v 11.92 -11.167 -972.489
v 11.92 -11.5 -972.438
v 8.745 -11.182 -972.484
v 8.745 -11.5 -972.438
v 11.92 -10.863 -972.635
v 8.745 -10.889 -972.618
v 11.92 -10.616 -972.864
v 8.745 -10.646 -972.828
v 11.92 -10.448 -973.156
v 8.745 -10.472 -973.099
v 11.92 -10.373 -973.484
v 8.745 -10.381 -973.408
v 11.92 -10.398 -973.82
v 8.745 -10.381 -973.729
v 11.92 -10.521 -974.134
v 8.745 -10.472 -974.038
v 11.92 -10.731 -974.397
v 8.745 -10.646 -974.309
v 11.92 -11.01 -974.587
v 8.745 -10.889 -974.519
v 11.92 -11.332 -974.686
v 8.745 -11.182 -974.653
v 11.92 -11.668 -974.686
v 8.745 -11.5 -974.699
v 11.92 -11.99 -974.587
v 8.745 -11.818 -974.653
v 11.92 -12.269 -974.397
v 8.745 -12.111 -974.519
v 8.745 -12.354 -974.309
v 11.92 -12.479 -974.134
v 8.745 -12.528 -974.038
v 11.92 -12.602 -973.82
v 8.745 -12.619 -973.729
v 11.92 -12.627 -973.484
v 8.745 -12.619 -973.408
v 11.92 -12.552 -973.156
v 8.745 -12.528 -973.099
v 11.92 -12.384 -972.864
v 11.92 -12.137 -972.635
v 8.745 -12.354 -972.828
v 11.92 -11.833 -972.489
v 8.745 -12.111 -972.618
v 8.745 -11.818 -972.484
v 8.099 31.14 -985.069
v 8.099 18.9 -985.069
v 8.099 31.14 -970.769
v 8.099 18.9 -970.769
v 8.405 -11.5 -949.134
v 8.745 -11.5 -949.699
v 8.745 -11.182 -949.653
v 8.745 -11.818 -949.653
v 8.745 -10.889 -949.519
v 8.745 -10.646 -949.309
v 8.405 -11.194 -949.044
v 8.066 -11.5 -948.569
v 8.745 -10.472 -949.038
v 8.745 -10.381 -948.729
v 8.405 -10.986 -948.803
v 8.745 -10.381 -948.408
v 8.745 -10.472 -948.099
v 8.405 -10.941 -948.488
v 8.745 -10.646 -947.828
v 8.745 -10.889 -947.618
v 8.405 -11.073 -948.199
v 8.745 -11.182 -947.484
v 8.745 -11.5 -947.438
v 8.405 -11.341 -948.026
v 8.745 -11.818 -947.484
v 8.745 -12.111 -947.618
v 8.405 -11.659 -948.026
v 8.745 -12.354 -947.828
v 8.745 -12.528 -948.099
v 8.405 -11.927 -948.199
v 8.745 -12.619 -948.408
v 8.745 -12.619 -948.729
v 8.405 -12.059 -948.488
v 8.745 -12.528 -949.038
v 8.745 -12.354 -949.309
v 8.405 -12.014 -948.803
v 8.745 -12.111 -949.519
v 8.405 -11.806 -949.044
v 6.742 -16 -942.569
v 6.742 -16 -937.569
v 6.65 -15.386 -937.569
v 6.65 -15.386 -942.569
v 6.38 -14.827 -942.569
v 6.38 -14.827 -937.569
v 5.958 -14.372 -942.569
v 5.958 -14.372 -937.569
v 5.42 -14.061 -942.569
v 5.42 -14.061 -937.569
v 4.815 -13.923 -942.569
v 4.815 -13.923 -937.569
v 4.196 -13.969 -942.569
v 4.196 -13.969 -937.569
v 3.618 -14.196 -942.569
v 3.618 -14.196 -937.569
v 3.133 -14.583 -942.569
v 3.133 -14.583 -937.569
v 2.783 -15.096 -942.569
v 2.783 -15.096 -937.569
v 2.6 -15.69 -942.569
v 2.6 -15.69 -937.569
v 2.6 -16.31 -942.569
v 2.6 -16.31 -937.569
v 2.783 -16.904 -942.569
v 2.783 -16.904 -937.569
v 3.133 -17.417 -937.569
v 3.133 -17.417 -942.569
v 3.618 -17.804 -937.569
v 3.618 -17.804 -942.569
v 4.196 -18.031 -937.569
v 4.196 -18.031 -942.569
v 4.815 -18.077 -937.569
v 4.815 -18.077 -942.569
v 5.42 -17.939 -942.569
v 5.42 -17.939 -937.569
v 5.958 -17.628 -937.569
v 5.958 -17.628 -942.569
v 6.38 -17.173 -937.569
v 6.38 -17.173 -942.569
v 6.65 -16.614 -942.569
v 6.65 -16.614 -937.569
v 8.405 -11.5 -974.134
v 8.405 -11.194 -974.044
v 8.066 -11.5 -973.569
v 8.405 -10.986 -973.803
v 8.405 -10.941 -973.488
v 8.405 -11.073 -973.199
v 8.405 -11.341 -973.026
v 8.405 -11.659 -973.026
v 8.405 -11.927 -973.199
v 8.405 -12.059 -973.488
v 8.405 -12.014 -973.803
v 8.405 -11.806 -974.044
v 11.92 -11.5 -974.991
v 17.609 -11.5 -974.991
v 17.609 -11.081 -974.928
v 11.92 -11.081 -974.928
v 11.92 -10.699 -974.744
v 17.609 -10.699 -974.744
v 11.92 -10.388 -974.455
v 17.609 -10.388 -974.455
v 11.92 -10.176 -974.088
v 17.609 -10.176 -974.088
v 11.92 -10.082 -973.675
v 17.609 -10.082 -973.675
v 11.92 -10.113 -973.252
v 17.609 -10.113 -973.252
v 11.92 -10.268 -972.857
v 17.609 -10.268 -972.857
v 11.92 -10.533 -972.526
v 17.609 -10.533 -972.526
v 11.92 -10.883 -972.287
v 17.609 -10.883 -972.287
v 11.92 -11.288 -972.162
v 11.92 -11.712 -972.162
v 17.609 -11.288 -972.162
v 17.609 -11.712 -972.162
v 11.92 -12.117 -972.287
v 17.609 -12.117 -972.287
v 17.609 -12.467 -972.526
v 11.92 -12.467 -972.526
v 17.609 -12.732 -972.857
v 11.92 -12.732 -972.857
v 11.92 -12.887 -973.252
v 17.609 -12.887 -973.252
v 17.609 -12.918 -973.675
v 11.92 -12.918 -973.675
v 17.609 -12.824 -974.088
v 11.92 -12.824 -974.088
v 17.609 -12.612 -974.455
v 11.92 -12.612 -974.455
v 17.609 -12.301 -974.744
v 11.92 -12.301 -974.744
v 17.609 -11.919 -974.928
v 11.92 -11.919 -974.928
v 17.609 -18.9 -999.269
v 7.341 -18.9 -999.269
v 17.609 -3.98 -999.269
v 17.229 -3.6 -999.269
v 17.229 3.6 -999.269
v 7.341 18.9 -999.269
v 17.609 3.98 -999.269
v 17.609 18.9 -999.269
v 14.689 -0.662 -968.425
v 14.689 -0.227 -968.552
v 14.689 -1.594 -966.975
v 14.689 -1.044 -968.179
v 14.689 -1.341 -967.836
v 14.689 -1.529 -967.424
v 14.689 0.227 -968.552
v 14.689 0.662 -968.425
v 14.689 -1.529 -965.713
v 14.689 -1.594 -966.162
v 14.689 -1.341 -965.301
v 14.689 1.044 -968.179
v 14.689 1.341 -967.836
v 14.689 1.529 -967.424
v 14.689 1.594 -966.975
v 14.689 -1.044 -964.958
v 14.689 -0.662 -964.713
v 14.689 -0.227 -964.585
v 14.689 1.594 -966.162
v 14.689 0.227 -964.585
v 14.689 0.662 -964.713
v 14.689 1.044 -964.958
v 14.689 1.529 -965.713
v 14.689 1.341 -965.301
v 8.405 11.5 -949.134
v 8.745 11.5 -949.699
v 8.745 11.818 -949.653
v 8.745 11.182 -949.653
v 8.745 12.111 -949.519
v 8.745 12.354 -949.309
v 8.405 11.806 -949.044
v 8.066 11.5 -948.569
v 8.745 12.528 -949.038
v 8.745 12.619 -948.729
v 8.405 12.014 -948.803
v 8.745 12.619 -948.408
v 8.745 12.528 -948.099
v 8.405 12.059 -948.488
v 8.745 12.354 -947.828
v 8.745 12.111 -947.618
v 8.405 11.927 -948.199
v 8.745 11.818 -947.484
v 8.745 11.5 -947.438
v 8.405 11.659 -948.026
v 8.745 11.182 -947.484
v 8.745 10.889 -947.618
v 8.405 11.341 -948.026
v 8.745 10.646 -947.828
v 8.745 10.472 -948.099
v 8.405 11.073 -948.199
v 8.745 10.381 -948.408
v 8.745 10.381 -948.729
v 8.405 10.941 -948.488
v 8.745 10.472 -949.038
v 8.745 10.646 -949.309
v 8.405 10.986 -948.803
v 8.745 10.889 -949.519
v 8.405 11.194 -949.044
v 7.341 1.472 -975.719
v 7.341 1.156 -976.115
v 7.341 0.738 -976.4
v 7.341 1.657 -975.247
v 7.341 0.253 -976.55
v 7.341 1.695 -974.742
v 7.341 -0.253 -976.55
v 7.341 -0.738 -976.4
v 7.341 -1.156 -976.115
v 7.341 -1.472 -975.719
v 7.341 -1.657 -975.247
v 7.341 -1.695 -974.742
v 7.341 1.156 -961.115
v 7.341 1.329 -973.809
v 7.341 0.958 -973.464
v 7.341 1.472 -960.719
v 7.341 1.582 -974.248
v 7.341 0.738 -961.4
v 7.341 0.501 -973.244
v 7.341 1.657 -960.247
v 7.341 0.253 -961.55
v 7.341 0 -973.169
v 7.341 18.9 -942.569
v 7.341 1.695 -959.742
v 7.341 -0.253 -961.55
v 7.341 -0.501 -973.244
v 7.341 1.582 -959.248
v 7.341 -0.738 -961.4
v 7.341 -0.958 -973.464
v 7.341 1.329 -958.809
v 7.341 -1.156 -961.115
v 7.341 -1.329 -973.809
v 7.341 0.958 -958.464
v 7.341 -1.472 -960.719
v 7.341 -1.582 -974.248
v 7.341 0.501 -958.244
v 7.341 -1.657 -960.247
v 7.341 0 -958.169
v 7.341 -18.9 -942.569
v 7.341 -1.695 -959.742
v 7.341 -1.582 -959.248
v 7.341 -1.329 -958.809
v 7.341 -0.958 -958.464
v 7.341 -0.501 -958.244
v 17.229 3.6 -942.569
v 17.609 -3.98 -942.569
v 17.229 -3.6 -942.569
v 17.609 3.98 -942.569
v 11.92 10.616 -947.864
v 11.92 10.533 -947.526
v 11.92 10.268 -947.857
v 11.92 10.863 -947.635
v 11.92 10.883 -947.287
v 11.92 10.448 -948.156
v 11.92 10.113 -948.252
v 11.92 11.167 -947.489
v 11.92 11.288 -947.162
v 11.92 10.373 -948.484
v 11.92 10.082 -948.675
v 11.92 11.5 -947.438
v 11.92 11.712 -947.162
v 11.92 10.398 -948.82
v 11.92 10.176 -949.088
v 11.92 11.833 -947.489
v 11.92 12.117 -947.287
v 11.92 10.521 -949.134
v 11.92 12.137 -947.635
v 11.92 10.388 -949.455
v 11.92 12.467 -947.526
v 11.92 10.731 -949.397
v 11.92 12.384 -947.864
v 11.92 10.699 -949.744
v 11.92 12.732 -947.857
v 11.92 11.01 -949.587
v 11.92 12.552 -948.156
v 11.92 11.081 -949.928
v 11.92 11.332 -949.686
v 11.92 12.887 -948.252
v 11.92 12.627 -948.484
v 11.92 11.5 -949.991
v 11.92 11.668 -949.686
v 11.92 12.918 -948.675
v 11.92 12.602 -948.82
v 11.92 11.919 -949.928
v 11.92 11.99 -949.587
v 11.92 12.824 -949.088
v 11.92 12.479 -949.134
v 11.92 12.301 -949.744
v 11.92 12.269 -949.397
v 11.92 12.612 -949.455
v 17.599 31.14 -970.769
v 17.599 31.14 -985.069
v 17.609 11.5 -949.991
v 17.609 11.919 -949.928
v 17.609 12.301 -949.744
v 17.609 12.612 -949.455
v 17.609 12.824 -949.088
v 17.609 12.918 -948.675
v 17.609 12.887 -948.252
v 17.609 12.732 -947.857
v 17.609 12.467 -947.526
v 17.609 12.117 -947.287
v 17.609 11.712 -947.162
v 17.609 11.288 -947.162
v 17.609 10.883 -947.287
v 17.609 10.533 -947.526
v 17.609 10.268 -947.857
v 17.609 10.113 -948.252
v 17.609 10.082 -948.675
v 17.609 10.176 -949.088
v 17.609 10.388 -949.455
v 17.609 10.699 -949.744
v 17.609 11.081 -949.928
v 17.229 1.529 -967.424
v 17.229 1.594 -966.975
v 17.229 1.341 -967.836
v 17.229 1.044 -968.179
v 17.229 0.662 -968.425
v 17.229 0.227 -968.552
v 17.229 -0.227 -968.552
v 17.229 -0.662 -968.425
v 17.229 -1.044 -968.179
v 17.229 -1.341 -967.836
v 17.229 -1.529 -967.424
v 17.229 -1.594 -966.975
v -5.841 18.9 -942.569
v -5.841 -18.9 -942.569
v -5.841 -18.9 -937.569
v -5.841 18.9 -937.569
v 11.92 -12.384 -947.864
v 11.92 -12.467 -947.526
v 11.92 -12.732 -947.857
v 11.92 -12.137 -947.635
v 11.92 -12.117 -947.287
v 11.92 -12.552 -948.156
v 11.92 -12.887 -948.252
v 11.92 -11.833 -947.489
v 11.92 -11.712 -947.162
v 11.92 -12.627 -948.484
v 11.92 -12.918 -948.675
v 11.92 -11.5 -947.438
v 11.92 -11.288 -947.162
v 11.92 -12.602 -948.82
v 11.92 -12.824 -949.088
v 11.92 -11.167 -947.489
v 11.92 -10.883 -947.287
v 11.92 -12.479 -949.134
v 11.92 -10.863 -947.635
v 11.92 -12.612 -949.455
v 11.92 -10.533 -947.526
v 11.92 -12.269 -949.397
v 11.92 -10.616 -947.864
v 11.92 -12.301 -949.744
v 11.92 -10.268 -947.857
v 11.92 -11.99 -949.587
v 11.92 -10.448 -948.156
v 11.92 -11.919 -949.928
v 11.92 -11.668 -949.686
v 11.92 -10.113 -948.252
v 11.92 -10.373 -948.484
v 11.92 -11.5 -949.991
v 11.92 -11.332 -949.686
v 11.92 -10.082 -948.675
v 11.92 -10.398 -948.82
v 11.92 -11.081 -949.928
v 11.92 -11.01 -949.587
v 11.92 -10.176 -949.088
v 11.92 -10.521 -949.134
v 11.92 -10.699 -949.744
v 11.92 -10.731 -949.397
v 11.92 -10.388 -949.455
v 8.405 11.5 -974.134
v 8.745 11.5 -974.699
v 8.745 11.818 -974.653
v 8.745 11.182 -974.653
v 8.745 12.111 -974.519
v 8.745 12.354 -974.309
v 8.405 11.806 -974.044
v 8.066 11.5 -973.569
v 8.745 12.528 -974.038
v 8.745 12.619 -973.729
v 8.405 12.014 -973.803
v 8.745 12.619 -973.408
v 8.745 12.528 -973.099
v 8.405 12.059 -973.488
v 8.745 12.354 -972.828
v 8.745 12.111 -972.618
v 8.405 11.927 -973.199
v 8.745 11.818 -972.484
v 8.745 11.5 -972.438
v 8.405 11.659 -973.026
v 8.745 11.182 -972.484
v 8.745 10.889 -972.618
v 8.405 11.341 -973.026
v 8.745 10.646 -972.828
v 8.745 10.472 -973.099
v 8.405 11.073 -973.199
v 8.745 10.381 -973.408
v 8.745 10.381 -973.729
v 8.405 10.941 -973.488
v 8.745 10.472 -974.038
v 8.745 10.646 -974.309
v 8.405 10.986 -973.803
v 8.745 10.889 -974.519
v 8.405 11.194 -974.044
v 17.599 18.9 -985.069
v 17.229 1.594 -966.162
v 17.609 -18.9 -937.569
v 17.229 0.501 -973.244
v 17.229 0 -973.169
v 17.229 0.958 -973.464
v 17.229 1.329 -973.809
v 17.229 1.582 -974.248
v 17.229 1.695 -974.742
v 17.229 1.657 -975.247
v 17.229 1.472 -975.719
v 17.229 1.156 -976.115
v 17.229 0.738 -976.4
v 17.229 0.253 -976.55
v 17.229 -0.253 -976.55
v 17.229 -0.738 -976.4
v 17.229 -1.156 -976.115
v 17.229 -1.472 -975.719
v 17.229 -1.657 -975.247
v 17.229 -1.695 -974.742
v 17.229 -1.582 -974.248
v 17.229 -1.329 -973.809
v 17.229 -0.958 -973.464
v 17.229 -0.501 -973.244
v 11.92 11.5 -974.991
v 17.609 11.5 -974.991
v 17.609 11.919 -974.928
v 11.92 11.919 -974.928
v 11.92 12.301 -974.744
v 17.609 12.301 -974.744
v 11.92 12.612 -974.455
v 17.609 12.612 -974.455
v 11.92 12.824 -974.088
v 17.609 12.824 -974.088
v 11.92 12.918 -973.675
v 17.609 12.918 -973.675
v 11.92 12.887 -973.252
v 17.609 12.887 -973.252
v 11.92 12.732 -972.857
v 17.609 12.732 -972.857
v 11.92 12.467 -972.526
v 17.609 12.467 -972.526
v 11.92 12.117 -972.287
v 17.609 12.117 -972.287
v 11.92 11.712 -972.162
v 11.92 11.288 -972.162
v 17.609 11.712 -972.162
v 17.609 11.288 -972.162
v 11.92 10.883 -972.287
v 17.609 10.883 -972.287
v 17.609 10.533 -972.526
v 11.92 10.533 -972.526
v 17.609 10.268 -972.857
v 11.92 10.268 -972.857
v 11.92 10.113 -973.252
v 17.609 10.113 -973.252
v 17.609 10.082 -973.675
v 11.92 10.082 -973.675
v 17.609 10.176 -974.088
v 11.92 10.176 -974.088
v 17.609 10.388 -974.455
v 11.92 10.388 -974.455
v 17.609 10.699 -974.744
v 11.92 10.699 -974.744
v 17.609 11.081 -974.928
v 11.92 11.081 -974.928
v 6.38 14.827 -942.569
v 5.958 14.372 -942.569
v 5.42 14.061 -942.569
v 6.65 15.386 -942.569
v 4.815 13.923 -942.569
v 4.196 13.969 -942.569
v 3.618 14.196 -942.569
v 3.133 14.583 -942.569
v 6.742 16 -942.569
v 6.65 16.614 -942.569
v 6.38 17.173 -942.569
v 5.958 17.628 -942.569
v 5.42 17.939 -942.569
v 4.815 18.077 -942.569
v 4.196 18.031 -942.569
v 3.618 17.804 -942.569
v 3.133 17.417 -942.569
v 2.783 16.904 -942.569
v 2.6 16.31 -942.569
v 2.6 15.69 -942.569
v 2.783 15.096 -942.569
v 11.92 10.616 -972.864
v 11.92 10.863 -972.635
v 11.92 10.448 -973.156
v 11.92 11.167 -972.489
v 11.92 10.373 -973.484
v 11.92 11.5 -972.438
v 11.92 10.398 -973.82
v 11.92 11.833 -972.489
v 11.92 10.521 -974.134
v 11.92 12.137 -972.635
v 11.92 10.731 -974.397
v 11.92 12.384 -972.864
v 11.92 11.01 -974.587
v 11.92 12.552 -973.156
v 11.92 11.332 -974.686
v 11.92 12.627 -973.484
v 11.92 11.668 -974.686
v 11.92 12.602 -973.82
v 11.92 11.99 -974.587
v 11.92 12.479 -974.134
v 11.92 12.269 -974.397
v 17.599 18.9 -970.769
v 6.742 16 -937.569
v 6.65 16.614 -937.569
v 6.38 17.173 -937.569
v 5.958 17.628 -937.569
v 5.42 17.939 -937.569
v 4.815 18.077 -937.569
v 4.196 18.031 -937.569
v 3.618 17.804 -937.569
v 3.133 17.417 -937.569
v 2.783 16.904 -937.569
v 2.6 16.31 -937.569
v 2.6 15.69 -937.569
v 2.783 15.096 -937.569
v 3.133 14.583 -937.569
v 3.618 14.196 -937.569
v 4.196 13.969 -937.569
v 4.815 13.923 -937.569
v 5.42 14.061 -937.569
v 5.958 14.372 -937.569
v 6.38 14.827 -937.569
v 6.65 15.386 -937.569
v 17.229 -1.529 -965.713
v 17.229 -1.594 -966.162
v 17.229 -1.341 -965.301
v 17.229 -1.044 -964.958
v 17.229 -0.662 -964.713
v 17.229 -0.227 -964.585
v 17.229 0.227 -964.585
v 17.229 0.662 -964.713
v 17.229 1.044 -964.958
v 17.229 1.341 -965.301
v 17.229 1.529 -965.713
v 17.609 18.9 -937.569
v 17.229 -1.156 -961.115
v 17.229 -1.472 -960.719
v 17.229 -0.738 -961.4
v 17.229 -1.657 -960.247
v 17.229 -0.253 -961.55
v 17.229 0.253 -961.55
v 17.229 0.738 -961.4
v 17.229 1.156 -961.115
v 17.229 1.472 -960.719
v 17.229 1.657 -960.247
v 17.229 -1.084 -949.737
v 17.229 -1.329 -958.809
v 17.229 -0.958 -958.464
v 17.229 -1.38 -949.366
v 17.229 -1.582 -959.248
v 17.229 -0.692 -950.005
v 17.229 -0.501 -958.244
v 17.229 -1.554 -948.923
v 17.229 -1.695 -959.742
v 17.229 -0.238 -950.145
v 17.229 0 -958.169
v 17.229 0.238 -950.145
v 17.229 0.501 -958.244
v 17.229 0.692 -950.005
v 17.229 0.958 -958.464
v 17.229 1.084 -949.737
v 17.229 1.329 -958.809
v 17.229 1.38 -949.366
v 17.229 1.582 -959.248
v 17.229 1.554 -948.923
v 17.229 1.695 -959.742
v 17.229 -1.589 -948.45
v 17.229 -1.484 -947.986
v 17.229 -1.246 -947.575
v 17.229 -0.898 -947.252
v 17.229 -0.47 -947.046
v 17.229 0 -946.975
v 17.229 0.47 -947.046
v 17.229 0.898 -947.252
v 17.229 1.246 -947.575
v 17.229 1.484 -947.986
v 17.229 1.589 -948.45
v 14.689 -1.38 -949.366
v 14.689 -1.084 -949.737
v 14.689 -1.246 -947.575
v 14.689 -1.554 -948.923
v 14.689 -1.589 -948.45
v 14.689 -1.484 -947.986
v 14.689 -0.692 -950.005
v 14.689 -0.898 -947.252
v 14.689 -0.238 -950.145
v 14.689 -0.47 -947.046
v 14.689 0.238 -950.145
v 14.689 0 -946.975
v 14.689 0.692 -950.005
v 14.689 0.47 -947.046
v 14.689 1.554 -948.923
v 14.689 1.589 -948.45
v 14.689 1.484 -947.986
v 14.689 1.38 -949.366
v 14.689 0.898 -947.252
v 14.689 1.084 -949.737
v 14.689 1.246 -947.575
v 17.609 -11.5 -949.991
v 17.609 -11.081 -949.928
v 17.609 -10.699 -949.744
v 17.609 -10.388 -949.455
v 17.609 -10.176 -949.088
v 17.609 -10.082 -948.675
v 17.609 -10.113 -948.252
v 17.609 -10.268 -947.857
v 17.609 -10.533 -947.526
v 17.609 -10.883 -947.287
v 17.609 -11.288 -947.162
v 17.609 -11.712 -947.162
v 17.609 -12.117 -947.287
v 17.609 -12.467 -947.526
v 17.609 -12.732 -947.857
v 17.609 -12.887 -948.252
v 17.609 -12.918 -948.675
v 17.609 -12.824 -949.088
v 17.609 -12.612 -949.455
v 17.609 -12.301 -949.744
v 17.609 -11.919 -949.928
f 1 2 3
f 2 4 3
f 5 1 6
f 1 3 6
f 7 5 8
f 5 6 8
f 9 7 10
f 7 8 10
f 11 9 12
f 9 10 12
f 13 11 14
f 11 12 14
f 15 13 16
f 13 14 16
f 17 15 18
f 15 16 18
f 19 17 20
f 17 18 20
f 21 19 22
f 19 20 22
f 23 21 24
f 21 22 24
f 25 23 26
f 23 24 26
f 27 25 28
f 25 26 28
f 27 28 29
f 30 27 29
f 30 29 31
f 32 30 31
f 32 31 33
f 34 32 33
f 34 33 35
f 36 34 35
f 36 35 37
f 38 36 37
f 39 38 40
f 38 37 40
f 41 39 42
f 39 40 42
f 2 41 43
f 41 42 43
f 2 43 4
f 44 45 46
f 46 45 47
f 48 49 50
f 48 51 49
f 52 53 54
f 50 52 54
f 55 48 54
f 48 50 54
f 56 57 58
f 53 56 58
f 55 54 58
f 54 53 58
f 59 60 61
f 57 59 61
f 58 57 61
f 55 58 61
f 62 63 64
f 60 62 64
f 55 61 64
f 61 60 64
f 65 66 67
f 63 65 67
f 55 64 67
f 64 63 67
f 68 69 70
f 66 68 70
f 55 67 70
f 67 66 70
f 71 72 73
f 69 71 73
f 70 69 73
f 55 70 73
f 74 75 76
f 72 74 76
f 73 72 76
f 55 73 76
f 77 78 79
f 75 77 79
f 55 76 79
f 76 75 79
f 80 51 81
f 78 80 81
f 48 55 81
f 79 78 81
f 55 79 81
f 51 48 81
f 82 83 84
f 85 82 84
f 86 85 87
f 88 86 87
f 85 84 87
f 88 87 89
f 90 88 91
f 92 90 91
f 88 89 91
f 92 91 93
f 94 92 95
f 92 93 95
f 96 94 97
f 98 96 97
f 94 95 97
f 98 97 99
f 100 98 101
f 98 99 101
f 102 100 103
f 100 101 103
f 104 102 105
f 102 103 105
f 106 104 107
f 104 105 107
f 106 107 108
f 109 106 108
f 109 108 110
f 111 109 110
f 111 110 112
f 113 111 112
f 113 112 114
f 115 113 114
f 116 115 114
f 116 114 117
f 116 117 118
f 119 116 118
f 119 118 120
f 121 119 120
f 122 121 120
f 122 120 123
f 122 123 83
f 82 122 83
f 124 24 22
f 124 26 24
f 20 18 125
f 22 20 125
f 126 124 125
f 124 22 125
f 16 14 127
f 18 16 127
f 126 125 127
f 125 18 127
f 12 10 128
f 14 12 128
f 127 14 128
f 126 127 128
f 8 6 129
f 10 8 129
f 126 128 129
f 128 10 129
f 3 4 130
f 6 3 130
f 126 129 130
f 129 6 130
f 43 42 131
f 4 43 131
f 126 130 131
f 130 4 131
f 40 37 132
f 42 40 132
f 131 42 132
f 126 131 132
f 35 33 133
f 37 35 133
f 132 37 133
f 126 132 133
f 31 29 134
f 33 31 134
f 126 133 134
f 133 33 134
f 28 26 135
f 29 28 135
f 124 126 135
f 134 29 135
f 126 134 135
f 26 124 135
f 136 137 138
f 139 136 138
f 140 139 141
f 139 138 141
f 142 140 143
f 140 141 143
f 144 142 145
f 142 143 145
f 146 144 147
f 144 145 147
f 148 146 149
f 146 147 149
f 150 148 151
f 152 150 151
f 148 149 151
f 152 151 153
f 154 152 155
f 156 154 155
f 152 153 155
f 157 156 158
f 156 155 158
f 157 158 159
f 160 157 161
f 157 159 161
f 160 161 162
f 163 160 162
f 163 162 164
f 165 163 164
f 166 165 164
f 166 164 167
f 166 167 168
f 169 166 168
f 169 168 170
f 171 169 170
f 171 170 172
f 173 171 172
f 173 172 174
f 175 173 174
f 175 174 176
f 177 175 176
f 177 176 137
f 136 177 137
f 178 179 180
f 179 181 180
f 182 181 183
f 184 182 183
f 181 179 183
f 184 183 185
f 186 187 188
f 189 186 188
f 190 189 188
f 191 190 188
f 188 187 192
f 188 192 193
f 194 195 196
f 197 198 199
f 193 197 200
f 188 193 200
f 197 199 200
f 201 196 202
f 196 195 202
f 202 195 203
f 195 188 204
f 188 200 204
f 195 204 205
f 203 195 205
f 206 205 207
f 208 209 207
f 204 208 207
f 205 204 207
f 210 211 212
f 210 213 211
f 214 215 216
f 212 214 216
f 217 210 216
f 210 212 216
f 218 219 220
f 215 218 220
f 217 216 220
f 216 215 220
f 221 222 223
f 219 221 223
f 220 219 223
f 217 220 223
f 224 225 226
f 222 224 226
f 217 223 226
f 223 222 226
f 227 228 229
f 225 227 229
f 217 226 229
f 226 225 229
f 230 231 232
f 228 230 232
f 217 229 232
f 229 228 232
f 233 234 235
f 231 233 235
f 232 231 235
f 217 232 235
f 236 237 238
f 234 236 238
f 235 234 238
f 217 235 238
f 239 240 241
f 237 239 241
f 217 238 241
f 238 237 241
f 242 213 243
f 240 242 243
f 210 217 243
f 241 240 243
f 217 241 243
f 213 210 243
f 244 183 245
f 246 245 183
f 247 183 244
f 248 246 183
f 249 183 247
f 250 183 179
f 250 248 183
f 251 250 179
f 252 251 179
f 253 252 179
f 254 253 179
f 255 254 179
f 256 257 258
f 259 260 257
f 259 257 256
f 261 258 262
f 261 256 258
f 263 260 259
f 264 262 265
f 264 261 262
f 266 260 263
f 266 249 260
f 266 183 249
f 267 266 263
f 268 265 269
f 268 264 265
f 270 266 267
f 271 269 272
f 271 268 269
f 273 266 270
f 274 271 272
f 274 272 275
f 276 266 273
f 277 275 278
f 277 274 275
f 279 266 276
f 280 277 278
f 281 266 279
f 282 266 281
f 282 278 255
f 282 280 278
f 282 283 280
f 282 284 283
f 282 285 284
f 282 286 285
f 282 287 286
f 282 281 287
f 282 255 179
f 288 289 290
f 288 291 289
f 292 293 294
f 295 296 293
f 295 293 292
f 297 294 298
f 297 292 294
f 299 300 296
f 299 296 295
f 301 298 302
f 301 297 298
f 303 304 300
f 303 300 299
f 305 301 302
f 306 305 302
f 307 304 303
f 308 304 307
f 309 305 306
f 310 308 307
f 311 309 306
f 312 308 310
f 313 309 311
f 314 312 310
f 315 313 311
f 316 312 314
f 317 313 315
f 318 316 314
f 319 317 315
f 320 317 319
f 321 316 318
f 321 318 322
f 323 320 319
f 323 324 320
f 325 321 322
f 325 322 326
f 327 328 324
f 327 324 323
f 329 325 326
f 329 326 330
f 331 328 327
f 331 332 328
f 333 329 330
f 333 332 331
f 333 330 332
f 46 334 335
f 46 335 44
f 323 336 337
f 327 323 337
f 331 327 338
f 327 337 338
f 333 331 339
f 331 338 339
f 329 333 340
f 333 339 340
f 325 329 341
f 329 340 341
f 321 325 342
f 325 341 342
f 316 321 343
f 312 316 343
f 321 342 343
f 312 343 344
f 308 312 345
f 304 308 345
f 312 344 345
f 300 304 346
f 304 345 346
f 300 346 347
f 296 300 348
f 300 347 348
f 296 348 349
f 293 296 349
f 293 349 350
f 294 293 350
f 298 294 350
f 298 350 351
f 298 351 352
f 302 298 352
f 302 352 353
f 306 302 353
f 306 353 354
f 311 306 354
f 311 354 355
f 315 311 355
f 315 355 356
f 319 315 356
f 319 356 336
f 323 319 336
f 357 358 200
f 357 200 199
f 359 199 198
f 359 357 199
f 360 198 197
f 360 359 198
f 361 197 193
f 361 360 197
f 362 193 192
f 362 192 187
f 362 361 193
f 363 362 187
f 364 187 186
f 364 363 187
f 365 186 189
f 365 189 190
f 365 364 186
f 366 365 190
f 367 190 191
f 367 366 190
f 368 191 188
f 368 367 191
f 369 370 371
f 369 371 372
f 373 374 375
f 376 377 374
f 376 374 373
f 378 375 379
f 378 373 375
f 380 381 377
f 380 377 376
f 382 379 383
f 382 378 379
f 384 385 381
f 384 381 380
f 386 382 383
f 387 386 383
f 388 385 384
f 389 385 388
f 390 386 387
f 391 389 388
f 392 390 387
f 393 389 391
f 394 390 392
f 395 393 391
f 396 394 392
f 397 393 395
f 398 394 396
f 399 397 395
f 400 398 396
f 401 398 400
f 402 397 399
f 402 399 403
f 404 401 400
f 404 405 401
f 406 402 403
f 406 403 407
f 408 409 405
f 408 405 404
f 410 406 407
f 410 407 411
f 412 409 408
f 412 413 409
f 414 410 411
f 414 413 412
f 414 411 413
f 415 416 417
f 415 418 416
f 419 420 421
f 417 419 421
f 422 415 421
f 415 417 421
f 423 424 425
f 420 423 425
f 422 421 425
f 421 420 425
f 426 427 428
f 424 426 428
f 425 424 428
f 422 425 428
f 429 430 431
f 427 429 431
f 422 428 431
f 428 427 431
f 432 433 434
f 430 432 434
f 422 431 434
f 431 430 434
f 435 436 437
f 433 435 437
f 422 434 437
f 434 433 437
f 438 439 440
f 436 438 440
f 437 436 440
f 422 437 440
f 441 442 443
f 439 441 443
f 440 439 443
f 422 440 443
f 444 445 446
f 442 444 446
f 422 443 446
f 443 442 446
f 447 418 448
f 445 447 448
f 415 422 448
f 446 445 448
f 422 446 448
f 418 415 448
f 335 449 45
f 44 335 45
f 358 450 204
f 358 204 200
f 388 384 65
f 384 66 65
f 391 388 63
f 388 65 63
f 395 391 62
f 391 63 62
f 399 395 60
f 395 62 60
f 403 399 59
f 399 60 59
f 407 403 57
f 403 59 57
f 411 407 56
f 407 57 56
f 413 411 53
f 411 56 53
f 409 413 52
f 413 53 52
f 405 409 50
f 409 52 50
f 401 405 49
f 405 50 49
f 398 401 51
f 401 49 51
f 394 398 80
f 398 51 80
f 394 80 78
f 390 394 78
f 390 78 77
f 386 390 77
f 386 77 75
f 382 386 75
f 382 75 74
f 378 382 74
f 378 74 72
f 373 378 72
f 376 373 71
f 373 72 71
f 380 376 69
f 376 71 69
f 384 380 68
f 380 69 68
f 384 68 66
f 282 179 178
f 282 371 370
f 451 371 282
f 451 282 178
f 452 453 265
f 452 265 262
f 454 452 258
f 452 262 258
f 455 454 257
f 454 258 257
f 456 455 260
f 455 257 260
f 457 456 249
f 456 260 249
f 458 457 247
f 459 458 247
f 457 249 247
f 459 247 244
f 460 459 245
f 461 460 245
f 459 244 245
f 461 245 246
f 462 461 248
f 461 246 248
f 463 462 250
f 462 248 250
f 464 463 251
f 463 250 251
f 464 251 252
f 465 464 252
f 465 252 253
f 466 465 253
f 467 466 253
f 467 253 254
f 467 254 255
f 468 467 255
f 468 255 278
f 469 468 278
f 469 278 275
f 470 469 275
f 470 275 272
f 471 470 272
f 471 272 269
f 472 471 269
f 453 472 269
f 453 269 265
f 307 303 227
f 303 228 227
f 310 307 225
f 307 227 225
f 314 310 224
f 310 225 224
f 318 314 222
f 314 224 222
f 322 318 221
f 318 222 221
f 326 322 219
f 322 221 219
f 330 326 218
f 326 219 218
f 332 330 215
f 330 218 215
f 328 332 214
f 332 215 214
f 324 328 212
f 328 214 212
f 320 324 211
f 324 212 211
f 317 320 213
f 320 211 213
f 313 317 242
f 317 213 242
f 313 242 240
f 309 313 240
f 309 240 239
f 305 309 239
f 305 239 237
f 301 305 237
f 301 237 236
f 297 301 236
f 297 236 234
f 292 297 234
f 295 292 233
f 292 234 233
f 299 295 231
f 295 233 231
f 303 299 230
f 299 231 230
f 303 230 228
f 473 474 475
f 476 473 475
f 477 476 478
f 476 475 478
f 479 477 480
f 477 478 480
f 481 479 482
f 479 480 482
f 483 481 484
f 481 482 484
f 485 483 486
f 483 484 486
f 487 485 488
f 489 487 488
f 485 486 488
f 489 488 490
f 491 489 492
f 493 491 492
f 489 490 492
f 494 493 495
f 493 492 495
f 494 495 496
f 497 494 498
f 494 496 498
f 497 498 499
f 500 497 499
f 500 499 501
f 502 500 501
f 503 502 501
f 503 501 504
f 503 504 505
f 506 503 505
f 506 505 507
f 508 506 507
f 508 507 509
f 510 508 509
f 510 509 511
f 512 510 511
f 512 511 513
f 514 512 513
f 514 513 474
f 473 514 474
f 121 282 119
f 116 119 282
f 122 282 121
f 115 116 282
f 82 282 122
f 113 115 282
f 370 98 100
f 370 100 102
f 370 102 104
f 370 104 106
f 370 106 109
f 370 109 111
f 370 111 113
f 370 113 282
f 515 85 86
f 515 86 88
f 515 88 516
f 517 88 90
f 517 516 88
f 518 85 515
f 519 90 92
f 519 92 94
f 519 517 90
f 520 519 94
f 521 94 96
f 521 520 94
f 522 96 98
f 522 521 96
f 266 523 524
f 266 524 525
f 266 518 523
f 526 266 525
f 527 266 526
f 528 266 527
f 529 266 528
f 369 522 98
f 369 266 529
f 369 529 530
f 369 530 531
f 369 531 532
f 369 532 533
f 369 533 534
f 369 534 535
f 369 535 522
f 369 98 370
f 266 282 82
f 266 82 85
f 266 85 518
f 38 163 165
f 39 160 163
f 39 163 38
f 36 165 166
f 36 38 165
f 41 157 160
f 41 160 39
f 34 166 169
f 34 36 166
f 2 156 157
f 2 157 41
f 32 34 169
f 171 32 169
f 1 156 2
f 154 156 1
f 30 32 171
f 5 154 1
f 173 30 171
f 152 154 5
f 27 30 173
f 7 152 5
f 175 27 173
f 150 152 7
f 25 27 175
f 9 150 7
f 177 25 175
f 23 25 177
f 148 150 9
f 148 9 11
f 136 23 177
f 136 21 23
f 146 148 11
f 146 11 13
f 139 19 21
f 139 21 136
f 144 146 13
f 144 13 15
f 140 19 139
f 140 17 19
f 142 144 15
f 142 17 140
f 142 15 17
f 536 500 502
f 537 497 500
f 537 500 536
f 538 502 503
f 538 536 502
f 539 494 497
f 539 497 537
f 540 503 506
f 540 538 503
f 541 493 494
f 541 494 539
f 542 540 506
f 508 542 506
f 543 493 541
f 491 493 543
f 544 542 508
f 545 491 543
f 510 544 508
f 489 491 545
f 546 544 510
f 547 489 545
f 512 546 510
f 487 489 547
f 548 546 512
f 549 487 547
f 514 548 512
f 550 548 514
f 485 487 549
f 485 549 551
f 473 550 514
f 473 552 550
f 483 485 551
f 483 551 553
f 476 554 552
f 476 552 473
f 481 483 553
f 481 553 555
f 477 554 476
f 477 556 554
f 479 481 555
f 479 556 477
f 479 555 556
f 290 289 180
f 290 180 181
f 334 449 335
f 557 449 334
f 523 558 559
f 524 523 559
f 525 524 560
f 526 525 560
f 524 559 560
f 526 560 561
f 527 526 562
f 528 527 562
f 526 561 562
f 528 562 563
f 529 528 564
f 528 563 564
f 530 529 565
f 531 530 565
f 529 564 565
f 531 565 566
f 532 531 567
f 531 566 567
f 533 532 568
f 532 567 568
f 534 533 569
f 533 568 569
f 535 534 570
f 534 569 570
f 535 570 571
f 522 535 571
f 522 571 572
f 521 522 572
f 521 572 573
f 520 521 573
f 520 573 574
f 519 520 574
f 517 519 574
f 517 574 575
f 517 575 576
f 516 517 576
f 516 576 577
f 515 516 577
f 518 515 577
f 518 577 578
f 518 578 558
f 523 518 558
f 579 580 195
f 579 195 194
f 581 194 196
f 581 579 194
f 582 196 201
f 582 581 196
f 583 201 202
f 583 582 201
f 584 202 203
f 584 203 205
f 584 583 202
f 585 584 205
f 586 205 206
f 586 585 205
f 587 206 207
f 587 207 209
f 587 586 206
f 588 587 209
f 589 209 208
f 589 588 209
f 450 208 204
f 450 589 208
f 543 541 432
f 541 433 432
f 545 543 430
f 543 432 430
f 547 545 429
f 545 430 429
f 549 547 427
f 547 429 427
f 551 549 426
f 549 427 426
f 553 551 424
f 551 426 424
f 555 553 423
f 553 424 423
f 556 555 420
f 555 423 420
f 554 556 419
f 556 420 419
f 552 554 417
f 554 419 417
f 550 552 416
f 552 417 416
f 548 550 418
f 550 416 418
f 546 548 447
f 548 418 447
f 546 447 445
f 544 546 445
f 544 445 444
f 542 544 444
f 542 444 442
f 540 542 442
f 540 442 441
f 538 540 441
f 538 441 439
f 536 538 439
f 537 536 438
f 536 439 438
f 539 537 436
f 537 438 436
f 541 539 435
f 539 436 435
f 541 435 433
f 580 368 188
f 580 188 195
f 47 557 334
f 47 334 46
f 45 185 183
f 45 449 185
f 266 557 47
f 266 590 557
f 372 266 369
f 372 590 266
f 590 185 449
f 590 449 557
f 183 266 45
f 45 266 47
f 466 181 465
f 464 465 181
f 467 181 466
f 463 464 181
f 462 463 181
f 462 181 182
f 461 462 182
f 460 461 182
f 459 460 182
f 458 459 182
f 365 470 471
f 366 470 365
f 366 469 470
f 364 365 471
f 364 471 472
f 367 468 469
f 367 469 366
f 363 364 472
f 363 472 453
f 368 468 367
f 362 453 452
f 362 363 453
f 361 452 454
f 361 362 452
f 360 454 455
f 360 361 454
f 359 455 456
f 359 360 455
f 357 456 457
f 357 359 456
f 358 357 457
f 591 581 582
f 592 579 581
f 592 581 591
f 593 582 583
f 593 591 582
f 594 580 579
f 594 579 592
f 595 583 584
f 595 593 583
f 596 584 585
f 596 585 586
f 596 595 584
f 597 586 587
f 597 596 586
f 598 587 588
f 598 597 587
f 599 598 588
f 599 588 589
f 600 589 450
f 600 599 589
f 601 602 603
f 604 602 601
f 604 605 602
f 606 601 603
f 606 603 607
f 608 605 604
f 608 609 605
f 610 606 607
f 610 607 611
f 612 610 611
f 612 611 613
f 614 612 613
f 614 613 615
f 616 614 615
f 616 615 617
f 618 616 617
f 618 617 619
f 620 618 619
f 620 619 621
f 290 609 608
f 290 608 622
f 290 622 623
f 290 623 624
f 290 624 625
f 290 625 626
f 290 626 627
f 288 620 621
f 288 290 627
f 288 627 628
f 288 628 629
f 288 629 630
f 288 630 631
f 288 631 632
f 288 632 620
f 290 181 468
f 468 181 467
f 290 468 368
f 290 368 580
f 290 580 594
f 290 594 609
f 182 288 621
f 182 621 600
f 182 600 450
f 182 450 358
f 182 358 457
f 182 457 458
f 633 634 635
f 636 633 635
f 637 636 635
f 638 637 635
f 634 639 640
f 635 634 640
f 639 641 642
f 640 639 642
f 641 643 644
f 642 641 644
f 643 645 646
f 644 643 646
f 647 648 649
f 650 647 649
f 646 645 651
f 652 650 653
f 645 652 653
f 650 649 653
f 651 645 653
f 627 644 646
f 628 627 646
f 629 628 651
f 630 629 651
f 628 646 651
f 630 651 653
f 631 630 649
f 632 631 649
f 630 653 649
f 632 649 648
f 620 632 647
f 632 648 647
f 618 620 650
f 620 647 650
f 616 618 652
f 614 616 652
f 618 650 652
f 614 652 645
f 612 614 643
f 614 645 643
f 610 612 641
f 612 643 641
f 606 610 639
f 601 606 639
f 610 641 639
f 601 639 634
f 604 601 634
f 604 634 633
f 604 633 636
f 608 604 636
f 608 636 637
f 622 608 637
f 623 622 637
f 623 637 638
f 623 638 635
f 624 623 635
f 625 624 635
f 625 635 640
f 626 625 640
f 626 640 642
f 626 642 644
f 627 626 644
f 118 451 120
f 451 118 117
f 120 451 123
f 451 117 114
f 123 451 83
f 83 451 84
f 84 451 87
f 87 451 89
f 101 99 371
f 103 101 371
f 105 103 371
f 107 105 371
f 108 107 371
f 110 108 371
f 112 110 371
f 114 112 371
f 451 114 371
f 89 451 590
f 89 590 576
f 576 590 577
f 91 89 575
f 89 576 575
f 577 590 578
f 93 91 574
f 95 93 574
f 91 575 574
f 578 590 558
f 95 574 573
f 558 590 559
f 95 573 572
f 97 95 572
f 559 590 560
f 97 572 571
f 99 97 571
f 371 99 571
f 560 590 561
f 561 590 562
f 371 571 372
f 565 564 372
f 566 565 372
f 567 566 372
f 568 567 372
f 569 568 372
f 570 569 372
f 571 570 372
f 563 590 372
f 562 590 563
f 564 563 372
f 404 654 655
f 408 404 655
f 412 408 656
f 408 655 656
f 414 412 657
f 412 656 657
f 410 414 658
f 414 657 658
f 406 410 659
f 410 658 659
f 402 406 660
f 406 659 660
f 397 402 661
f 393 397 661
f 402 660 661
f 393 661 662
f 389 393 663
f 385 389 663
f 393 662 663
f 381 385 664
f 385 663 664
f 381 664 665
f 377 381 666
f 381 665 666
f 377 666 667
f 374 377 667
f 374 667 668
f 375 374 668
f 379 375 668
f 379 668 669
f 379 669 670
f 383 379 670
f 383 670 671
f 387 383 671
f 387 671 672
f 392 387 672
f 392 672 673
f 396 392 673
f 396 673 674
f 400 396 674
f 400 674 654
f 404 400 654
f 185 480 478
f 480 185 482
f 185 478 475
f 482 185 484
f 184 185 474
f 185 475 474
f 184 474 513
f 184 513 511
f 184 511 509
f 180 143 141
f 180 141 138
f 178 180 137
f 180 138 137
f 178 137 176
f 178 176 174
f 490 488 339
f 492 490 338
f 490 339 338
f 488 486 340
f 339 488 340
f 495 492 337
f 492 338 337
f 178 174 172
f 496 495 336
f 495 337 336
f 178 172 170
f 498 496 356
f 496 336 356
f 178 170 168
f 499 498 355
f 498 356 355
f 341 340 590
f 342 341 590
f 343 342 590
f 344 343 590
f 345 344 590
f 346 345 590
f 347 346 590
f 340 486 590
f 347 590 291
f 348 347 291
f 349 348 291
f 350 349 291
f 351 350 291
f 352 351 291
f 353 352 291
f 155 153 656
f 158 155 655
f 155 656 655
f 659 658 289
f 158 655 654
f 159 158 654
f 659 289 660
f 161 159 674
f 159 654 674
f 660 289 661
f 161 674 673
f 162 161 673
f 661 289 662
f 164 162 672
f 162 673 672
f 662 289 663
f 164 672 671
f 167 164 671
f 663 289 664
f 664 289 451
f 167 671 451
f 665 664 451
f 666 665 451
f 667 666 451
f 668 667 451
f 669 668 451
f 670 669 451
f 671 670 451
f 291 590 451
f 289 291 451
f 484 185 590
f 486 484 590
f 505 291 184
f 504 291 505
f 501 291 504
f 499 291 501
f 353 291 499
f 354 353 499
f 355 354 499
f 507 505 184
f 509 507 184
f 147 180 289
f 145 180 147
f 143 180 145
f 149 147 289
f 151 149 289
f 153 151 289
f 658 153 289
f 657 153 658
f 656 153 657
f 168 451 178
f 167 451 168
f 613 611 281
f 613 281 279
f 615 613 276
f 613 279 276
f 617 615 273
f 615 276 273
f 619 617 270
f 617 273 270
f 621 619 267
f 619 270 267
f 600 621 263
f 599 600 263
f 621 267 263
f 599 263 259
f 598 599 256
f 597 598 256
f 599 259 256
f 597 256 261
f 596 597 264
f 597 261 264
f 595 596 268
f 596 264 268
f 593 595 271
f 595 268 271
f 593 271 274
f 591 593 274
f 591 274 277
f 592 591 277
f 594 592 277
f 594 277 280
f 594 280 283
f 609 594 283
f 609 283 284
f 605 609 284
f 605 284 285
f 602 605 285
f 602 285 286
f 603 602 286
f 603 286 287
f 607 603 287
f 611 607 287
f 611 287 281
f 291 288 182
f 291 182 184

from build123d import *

# Parameters (mm, degrees)
BASE_EXTRUDE_DEPTH              = 5
BOSS_EXTRUDE1_DEPTH             = 56.7
BOSS_EXTRUDE3_DEPTH             = 5
F_3_4_DIAMETER_HOLE1_D          = 3.4
F_4_40_TAPPED_HOLE1_D           = 2.2606
F_4_40_TAPPED_HOLE1_DEPTH       = 8.8646
F_4_40_TAPPED_HOLE1_CBORE_D     = 2.8448
F_4_40_TAPPED_HOLE1_CBORE_DEPTH = 5.6896
F_4_40_TAPPED_HOLE1_TIP         = 0.679152758
F_4_40_TAPPED_HOLE2_D           = 3.4544
F_4_40_TAPPED_HOLE2_CBORE_D     = 4.1656
F_4_40_TAPPED_HOLE2_CBORE_DEPTH = 8.3312
CUT_EXTRUDE1_DEPTH              = 2.54
HOLE1_D                         = 3.1877
HOLE1_DEPTH                     = 2.54
SKETCH14_W                      = 9.5
SKETCH14_H                      = 14.3
BOSS_EXTRUDE2_DEPTH             = 12.24


with BuildPart() as part:
    # Sketch1 → Base-Extrude (new body)
    with BuildSketch(Plane.XY.offset(-942.568622791)):
        Polygon((-5.8406, 18.9), (17.6094, 18.9), (17.6094, 3.98), (17.2294, 3.6), (17.2294, -3.6), (17.6094, -3.98), (17.6094, -18.9), (-5.8406, -18.9), align=None)
    extrude(amount=BASE_EXTRUDE_DEPTH)

    # Sketch3 → Boss-Extrude1 (add)
    with BuildSketch(Plane(origin=(0, 0, -942.568622791), x_dir=(-1, 0, 0), z_dir=(0, 0, -1))):
        Polygon((-17.6094, 3.98), (-17.6094, 18.9), (-7.3406, 18.9), (-7.3406, -18.9), (-17.6094, -18.9), (-17.6094, -3.98), (-17.2294, -3.6), (-17.2294, 3.6), align=None)
    extrude(amount=BOSS_EXTRUDE1_DEPTH)

    # Sketch15 → Boss-Extrude3 (add)
    with BuildSketch(Plane.XY.offset(-937.568622791)):
        Polygon((17.6094, -3.98), (17.2294, -3.6), (17.2294, 3.6), (17.6094, 3.98), align=None)
    extrude(amount=-BOSS_EXTRUDE3_DEPTH)

    # 3.4 Diameter Hole1 (through all)
    with Locations(Plane(origin=(17.2294, 0, 0), x_dir=(0, 0, -1), z_dir=(1, 0, 0))):
        with Locations((959.868622791, 0), (974.868622791, 0)):
            Hole(F_3_4_DIAMETER_HOLE1_D / 2)

    # #4-40 Tapped Hole1
    with Locations(Plane(origin=(17.6094, 0, 0), x_dir=(0, 0, -1), z_dir=(1, 0, 0))):
        with Locations((948.568622791, 11.5), (973.568622791, 11.5), (948.568622791, -11.5), (973.568622791, -11.5)):
            CounterBoreHole(F_4_40_TAPPED_HOLE1_D / 2, F_4_40_TAPPED_HOLE1_CBORE_D / 2, F_4_40_TAPPED_HOLE1_CBORE_DEPTH, depth=F_4_40_TAPPED_HOLE1_DEPTH)
            with Locations((0, 0, -(F_4_40_TAPPED_HOLE1_DEPTH + F_4_40_TAPPED_HOLE1_TIP / 2))):  # 118° drill point
                Cone(0, F_4_40_TAPPED_HOLE1_D / 2, F_4_40_TAPPED_HOLE1_TIP, mode=Mode.SUBTRACT)

    # #4-40 Tapped Hole2 (through all)
    with Locations(Plane.XY.offset(-937.568622791)):
        with Locations((4.6594, 16), (4.6594, -16)):
            CounterBoreHole(F_4_40_TAPPED_HOLE2_D / 2, F_4_40_TAPPED_HOLE2_CBORE_D / 2, F_4_40_TAPPED_HOLE2_CBORE_DEPTH)

    # Sketch11 → Cut-Extrude1 (cut)
    with BuildSketch(Plane(origin=(17.2294, 0, 0), x_dir=(0, 0, -1), z_dir=(1, 0, 0))):
        with BuildLine():
            Line((966.162472791, 1.59385), (966.974772791, 1.59385))
            ThreePointArc((966.974772791, 1.59385), (968.568622791, 0), (966.974772791, -1.59385))
            Line((966.974772791, -1.59385), (966.162472791, -1.59385))
            ThreePointArc((966.162472791, -1.59385), (964.568622791, 0), (966.162472791, 1.59385))
        make_face()
    extrude(amount=-CUT_EXTRUDE1_DEPTH, mode=Mode.SUBTRACT)

    # Hole1
    with Locations(Plane(origin=(17.2294, 0, 0), x_dir=(0, 0, -1), z_dir=(1, 0, 0))):
        with Locations((948.568622791, 0)):
            Hole(HOLE1_D / 2, depth=HOLE1_DEPTH)

    # Sketch14 → Boss-Extrude2 (add)
    with BuildSketch(Plane(origin=(0, 18.9, 0), x_dir=(-1, 0, 0), z_dir=(0, 1, 0))):
        with Locations((-12.8494, -977.918622791)):
            Rectangle(SKETCH14_W, SKETCH14_H)
    extrude(amount=BOSS_EXTRUDE2_DEPTH)


solid = part.part
